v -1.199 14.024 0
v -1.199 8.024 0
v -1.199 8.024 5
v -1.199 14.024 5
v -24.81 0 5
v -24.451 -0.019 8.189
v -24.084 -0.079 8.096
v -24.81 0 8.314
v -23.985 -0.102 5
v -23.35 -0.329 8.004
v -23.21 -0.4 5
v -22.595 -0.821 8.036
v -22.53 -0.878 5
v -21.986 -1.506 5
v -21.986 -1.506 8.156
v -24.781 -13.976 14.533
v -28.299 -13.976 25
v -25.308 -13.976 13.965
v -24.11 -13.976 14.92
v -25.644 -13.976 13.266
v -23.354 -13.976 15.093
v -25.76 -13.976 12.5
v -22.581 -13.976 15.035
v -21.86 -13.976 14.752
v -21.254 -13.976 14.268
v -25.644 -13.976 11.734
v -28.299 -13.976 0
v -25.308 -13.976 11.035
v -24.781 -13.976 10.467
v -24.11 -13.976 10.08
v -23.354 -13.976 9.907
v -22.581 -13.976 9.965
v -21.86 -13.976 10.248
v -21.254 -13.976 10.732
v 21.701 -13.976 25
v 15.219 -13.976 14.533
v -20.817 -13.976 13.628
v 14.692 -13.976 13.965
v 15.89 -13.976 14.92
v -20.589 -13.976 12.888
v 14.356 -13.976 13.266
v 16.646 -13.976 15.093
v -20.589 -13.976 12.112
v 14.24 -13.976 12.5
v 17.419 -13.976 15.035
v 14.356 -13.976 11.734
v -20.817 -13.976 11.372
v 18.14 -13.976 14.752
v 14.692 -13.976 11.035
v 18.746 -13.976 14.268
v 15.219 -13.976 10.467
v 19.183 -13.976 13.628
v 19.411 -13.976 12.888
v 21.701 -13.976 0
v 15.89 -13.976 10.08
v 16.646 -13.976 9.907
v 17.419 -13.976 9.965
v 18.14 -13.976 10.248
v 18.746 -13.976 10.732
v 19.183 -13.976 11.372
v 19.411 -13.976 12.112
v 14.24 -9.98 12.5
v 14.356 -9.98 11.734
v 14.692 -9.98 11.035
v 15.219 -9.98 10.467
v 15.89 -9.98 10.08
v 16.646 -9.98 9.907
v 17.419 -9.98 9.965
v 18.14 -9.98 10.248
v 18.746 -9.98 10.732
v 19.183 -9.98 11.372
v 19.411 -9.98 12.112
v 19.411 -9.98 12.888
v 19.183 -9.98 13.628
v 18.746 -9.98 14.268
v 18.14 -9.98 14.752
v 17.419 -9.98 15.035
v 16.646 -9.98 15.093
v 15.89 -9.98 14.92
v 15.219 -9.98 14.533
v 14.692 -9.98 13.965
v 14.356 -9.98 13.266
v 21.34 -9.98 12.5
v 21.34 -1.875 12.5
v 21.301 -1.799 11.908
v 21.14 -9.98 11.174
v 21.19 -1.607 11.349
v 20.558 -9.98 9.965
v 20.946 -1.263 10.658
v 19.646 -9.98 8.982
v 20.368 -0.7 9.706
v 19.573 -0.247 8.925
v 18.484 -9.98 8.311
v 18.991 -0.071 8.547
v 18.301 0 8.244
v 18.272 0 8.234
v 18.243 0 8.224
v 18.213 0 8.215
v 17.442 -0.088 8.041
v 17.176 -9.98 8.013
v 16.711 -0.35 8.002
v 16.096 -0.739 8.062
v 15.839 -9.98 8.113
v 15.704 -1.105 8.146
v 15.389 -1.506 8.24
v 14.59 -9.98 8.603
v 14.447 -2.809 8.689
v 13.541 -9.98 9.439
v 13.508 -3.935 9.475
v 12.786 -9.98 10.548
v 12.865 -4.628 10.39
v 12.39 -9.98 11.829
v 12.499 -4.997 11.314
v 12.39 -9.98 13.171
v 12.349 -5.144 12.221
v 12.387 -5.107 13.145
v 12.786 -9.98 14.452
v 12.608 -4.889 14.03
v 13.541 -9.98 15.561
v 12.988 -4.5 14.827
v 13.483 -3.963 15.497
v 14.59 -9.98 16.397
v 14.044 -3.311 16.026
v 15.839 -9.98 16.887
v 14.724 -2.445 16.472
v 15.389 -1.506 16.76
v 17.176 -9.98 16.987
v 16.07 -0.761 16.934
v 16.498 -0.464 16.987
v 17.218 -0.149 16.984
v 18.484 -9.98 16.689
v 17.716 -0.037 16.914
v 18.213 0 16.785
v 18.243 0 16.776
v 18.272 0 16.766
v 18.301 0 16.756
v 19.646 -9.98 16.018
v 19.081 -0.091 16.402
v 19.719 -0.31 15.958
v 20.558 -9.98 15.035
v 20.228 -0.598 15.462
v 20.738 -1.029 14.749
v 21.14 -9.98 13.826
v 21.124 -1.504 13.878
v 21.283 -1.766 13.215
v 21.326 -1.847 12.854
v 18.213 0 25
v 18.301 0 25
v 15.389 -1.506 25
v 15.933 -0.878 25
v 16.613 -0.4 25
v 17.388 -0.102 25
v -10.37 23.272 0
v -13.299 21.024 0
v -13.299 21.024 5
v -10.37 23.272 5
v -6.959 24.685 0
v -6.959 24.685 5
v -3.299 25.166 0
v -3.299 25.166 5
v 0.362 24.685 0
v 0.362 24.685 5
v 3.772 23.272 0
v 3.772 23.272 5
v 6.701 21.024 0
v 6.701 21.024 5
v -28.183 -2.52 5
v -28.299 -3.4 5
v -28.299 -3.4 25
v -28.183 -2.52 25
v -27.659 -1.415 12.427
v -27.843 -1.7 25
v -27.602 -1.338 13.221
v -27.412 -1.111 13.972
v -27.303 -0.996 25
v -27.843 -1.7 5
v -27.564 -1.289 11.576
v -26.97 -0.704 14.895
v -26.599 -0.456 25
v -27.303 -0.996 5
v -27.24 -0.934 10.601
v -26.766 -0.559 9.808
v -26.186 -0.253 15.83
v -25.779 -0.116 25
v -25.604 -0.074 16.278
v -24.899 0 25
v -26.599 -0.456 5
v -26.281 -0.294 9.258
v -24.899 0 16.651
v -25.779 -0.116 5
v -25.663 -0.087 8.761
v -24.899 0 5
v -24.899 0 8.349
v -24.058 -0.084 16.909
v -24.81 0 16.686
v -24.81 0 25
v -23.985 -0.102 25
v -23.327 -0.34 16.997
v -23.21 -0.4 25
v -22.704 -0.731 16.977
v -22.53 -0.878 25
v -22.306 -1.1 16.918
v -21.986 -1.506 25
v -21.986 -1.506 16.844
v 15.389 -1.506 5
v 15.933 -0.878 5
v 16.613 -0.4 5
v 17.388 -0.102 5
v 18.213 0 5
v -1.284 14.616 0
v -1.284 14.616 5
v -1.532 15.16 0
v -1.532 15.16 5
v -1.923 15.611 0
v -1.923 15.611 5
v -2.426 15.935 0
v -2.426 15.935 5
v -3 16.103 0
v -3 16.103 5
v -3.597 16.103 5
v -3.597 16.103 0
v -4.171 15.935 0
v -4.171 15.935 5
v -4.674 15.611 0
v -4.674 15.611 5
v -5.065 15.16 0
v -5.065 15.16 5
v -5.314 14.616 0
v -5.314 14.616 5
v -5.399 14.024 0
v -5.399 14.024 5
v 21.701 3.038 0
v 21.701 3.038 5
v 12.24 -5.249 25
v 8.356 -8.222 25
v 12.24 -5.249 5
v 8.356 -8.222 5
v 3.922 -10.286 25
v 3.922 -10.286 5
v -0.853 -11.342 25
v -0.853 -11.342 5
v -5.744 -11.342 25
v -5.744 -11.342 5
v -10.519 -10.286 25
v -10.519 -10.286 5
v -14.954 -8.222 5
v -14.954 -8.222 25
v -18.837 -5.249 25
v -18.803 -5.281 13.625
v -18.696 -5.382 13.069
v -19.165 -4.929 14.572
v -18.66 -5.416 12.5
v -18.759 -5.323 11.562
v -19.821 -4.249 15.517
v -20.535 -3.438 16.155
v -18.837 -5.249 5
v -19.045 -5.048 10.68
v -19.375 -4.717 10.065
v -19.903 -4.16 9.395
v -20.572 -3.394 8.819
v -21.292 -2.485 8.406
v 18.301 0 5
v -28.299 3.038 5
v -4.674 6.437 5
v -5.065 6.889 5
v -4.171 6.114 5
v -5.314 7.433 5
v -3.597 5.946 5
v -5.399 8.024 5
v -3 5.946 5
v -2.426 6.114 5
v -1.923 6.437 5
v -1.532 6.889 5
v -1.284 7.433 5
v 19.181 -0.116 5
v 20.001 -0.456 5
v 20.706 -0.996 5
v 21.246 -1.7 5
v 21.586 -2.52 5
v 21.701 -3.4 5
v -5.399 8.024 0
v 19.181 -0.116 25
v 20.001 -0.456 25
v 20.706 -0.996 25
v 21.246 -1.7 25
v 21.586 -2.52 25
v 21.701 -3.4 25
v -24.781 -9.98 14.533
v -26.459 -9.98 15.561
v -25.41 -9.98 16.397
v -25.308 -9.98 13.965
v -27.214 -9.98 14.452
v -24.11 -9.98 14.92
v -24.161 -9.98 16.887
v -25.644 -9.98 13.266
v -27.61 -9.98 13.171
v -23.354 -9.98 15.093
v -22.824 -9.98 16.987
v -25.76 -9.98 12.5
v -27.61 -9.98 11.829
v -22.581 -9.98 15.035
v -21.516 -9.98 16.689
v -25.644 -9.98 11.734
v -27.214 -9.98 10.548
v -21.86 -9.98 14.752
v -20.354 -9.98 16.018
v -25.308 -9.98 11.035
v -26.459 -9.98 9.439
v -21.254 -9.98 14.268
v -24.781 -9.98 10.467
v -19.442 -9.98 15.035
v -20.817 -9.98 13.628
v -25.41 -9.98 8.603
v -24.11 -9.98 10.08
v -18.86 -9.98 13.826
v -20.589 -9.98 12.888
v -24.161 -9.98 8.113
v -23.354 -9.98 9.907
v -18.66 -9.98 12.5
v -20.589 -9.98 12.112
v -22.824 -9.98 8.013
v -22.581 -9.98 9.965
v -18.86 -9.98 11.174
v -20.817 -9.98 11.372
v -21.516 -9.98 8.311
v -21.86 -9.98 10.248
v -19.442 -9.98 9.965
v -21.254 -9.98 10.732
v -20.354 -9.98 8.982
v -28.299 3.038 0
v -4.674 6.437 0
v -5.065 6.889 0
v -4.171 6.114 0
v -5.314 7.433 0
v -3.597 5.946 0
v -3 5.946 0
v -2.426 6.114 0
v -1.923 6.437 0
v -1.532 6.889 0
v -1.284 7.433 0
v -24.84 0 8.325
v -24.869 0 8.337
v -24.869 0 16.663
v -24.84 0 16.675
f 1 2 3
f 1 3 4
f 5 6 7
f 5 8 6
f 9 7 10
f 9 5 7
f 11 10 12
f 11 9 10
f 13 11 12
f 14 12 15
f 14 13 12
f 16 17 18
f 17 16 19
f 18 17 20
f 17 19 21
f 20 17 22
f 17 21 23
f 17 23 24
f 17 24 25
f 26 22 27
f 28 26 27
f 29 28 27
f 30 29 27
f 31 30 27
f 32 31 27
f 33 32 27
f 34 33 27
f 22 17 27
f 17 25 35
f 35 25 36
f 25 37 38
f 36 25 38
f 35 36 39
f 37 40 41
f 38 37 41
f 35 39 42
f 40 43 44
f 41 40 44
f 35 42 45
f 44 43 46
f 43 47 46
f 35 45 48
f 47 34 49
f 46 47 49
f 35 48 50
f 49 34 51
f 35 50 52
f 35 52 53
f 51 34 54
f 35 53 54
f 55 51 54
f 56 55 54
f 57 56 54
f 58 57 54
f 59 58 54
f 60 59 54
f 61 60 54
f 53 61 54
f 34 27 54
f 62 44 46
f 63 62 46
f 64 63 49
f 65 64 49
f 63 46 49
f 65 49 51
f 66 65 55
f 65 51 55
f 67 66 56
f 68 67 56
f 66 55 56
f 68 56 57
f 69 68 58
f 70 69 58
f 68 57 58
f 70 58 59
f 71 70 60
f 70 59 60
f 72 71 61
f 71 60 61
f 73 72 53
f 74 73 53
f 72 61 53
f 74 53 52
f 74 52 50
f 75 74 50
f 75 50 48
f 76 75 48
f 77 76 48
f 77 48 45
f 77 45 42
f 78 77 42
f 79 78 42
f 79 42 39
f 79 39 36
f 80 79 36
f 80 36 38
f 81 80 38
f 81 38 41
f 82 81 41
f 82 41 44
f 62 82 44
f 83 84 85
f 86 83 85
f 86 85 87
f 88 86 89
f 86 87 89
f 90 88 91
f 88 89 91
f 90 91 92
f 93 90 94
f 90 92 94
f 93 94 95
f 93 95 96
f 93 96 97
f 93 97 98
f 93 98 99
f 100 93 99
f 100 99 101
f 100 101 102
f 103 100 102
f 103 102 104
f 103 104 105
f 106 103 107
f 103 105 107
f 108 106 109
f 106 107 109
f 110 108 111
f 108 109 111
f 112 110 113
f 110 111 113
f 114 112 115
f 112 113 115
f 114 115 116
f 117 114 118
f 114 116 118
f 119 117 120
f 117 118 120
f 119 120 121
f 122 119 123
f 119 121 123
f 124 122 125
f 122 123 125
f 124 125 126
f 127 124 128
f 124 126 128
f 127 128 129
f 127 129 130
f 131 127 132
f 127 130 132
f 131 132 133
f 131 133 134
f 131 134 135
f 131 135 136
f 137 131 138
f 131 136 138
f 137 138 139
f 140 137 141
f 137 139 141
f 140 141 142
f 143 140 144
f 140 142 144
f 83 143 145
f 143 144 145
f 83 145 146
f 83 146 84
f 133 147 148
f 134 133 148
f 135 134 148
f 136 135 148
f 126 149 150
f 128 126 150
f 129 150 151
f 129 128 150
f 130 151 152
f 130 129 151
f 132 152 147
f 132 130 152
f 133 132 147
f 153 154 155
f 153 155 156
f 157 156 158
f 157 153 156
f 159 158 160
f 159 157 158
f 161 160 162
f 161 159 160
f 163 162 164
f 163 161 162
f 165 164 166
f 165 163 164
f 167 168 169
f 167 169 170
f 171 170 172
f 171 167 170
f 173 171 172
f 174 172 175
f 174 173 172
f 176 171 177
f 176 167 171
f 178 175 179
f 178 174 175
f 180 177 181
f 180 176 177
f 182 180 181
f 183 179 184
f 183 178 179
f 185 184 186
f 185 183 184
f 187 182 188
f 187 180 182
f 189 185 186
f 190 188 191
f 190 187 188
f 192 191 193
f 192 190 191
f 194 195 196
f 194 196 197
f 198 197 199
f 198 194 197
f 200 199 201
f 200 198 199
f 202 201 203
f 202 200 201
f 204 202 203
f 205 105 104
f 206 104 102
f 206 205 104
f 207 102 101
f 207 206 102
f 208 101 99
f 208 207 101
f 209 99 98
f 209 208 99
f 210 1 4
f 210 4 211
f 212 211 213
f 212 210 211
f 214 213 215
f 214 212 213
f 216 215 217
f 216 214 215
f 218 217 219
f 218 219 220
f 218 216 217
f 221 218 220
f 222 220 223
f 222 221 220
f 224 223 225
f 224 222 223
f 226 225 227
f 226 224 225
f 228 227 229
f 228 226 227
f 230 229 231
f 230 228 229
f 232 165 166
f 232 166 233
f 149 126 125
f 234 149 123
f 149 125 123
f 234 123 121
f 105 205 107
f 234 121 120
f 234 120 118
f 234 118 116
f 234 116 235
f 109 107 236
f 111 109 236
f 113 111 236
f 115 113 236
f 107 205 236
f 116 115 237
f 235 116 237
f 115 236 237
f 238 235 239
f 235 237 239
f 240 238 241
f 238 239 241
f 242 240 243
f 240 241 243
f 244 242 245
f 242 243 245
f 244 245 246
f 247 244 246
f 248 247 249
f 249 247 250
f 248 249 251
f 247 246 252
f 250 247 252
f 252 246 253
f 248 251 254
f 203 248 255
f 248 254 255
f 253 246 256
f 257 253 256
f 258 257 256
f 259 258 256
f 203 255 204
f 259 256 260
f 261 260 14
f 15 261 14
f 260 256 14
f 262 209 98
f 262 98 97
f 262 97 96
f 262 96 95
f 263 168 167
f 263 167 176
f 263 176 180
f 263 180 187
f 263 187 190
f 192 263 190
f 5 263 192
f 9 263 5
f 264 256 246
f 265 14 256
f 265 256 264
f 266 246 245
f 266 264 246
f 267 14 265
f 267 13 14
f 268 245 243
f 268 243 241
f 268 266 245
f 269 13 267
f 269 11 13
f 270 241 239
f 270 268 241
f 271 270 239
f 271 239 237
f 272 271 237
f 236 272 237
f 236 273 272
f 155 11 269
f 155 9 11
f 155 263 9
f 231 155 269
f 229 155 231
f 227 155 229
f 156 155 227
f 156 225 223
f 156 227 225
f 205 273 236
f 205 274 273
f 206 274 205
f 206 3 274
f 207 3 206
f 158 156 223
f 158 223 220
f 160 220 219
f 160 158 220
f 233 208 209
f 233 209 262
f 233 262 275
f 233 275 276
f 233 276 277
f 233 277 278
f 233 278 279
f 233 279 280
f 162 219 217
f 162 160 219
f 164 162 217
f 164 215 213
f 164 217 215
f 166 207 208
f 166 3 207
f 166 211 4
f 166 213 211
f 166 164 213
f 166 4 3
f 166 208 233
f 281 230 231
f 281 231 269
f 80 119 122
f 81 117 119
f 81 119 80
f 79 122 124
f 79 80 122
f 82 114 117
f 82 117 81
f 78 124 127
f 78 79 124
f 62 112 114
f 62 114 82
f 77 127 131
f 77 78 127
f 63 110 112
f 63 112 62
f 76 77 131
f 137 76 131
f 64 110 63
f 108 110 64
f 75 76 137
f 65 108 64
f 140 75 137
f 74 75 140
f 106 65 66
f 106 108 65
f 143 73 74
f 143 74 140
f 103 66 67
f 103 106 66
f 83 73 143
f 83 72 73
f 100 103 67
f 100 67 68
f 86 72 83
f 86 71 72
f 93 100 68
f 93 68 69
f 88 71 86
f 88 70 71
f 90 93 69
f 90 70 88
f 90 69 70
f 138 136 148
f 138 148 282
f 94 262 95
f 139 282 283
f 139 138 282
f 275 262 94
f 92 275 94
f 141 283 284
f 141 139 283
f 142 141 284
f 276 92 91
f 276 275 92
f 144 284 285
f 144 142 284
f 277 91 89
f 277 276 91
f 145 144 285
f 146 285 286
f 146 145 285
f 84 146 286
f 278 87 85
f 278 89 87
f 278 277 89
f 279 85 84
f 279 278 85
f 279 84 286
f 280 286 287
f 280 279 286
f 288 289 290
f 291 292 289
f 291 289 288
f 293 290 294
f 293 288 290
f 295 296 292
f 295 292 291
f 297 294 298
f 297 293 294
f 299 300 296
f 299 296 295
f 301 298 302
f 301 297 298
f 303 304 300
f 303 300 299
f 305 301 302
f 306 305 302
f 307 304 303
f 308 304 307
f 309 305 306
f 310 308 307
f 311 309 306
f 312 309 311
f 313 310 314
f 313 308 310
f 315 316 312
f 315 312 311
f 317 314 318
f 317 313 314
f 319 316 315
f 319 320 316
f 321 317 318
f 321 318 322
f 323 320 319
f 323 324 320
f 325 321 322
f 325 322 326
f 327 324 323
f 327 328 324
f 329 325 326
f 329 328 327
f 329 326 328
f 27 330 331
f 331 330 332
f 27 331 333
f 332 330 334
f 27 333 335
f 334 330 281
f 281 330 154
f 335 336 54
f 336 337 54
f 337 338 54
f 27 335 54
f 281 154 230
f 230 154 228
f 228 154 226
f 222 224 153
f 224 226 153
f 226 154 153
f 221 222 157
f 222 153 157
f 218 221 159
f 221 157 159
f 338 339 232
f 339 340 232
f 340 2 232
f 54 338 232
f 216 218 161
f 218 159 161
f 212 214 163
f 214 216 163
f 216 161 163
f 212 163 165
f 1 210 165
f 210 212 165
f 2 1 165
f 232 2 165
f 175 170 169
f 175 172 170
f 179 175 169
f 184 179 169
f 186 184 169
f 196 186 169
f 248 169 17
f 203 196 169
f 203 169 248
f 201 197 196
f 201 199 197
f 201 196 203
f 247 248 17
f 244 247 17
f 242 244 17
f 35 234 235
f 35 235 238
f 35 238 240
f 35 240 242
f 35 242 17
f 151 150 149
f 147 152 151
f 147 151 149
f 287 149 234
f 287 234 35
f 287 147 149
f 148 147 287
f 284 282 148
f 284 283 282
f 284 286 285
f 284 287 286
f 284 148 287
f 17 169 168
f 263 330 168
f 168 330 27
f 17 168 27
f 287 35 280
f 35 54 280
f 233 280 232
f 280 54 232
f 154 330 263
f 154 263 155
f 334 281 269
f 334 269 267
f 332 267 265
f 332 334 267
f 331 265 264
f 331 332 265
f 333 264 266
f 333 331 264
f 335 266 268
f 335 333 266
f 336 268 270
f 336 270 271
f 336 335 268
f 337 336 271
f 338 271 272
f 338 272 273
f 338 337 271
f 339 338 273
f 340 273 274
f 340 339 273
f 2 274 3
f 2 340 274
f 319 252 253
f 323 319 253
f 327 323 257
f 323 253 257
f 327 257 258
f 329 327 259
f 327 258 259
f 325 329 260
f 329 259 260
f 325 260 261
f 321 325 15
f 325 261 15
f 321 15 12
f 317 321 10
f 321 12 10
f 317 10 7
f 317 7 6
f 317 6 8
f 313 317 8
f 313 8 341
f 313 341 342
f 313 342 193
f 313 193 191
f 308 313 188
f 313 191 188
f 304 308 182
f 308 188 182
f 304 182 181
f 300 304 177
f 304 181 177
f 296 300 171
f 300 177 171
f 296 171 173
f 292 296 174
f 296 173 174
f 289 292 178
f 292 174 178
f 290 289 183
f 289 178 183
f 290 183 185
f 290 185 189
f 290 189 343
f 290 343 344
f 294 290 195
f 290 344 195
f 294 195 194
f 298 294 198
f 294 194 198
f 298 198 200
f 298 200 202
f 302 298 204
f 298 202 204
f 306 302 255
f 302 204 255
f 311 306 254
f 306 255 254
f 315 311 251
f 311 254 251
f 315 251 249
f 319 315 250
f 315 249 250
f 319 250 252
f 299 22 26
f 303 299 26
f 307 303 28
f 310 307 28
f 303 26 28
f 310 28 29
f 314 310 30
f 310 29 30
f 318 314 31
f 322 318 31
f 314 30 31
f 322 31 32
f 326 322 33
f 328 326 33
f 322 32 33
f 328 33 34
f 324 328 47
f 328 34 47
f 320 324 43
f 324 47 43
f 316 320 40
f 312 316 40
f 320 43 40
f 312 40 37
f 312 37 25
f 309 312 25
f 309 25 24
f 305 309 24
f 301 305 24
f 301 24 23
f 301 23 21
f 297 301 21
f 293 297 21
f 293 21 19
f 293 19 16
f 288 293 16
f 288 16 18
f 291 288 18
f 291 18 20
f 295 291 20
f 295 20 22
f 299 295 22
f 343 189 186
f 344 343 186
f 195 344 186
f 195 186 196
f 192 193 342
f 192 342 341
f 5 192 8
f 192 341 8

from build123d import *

# Parameters (mm, degrees)
EXTRUDE_1_DEPTH     = 25
EXTRUDE_2_DEPTH     = 5
CUT_EXTRUDE_START   = -20
CUT_EXTRUDE_2_DEPTH = 20
FILLET_3_R          = 3.4
FILLET_4_R          = 3.4
SKETCH_5_R          = 2.6
CUT_EXTRUDE_3_DEPTH = 20
SKETCH_7_R          = 4.5
CUT_EXTRUDE_5_DEPTH = 9.98


with BuildPart() as part:
    # 草图1 → 凸台-拉伸1 (new body)
    with BuildSketch(Plane.XY):
        with BuildLine():
            Line((-24.33363023, 3.038194444), (-28.298611111, 3.038194444))
            Line((-28.298611111, 3.038194444), (-28.298611111, -13.975694444))
            Line((-28.298611111, -13.975694444), (21.701388889, -13.975694444))
            Line((21.701388889, -13.975694444), (21.701388889, 3.038194444))
            Line((21.701388889, 3.038194444), (17.736408008, 3.038194444))
            ThreePointArc((17.736408008, 3.038194444), (-3.298611111, -11.475694444), (-24.33363023, 3.038194444))
        make_face()
    extrude(amount=EXTRUDE_1_DEPTH)

    # 草图1<5> → 凸台-拉伸2 (add)
    with BuildSketch(Plane.XY):
        with BuildLine():
            Line((-13.298611111, 21.024305556), (-28.298611111, 3.038194444))
            Line((-28.298611111, 3.038194444), (-24.33363023, 3.038194444))
            ThreePointArc((-24.33363023, 3.038194444), (-3.298611111, -11.475694444), (17.736408008, 3.038194444))
            Line((17.736408008, 3.038194444), (21.701388889, 3.038194444))
            Line((21.701388889, 3.038194444), (6.701388889, 21.024305556))
            ThreePointArc((6.701388889, 21.024305556), (-3.298611111, 25.166441179), (-13.298611111, 21.024305556))
        make_face()
        with BuildLine():
            ThreePointArc((-5.398611111, 14.024305556), (-3.298611111, 16.124305556), (-1.198611111, 14.024305556))
            Line((-1.198611111, 14.024305556), (-1.198611111, 8.024305556))
            ThreePointArc((-1.198611111, 8.024305556), (-3.298611111, 5.924305556), (-5.398611111, 8.024305556))
            Line((-5.398611111, 8.024305556), (-5.398611111, 14.024305556))
        make_face(mode=Mode.SUBTRACT)
    extrude(amount=EXTRUDE_2_DEPTH)

    # 草图3 → 切除-拉伸2 (cut)
    with BuildSketch(Plane.XY.offset(25).offset(CUT_EXTRUDE_START)):
        with BuildLine():
            Line((-28.298611111, 3.038194444), (-28.298611111, 0))
            Line((-28.298611111, 0), (-22.912756186, 0))
            ThreePointArc((-22.912756186, 0), (-23.679884226, 1.492584503), (-24.33363023, 3.038194444))
            Line((-24.33363023, 3.038194444), (-28.298611111, 3.038194444))
        make_face()
        with BuildLine():
            ThreePointArc((17.736408008, 3.038194444), (17.082662004, 1.492584503), (16.315533964, 0))
            Line((16.315533964, 0), (21.701388889, 0))
            Line((21.701388889, 0), (21.701388889, 3.038194444))
            Line((21.701388889, 3.038194444), (17.736408008, 3.038194444))
        make_face()
    extrude(amount=CUT_EXTRUDE_2_DEPTH, mode=Mode.SUBTRACT)

    # 圆角3
    fillet_3_edges = [part.edges().sort_by_distance(p)[0] for p in [
        (-22.912756186, 0, 15),
        (-28.298611111, 0, 15),
    ]]
    fillet(fillet_3_edges, radius=FILLET_3_R)

    # 圆角4
    fillet_4_edges = [part.edges().sort_by_distance(p)[0] for p in [
        (21.701388889, 0, 15),
        (16.315533964, 0, 15),
    ]]
    fillet(fillet_4_edges, radius=FILLET_4_R)

    # 草图5 → 切除-拉伸3 (cut)
    with BuildSketch(Plane(origin=(0, -13.975694444, 0), x_dir=(-1, 0, 0), z_dir=(0, -1, 0))):
        with Locations((23.159932347, -12.5)):
            Circle(SKETCH_5_R)
        with Locations((-16.840067653, -12.5)):
            Circle(SKETCH_5_R)
    extrude(amount=-CUT_EXTRUDE_3_DEPTH, mode=Mode.SUBTRACT)

    # 草图7 → 切除-拉伸5 (cut)
    with BuildSketch(Plane(origin=(0, 0, 0), x_dir=(1, 0, 0), z_dir=(0, 1, 0))):
        with Locations((-23.159932347, -12.5)):
            Circle(SKETCH_7_R)
        with Locations((16.840067653, -12.5)):
            Circle(SKETCH_7_R)
    extrude(amount=-CUT_EXTRUDE_5_DEPTH, mode=Mode.SUBTRACT)


solid = part.part
